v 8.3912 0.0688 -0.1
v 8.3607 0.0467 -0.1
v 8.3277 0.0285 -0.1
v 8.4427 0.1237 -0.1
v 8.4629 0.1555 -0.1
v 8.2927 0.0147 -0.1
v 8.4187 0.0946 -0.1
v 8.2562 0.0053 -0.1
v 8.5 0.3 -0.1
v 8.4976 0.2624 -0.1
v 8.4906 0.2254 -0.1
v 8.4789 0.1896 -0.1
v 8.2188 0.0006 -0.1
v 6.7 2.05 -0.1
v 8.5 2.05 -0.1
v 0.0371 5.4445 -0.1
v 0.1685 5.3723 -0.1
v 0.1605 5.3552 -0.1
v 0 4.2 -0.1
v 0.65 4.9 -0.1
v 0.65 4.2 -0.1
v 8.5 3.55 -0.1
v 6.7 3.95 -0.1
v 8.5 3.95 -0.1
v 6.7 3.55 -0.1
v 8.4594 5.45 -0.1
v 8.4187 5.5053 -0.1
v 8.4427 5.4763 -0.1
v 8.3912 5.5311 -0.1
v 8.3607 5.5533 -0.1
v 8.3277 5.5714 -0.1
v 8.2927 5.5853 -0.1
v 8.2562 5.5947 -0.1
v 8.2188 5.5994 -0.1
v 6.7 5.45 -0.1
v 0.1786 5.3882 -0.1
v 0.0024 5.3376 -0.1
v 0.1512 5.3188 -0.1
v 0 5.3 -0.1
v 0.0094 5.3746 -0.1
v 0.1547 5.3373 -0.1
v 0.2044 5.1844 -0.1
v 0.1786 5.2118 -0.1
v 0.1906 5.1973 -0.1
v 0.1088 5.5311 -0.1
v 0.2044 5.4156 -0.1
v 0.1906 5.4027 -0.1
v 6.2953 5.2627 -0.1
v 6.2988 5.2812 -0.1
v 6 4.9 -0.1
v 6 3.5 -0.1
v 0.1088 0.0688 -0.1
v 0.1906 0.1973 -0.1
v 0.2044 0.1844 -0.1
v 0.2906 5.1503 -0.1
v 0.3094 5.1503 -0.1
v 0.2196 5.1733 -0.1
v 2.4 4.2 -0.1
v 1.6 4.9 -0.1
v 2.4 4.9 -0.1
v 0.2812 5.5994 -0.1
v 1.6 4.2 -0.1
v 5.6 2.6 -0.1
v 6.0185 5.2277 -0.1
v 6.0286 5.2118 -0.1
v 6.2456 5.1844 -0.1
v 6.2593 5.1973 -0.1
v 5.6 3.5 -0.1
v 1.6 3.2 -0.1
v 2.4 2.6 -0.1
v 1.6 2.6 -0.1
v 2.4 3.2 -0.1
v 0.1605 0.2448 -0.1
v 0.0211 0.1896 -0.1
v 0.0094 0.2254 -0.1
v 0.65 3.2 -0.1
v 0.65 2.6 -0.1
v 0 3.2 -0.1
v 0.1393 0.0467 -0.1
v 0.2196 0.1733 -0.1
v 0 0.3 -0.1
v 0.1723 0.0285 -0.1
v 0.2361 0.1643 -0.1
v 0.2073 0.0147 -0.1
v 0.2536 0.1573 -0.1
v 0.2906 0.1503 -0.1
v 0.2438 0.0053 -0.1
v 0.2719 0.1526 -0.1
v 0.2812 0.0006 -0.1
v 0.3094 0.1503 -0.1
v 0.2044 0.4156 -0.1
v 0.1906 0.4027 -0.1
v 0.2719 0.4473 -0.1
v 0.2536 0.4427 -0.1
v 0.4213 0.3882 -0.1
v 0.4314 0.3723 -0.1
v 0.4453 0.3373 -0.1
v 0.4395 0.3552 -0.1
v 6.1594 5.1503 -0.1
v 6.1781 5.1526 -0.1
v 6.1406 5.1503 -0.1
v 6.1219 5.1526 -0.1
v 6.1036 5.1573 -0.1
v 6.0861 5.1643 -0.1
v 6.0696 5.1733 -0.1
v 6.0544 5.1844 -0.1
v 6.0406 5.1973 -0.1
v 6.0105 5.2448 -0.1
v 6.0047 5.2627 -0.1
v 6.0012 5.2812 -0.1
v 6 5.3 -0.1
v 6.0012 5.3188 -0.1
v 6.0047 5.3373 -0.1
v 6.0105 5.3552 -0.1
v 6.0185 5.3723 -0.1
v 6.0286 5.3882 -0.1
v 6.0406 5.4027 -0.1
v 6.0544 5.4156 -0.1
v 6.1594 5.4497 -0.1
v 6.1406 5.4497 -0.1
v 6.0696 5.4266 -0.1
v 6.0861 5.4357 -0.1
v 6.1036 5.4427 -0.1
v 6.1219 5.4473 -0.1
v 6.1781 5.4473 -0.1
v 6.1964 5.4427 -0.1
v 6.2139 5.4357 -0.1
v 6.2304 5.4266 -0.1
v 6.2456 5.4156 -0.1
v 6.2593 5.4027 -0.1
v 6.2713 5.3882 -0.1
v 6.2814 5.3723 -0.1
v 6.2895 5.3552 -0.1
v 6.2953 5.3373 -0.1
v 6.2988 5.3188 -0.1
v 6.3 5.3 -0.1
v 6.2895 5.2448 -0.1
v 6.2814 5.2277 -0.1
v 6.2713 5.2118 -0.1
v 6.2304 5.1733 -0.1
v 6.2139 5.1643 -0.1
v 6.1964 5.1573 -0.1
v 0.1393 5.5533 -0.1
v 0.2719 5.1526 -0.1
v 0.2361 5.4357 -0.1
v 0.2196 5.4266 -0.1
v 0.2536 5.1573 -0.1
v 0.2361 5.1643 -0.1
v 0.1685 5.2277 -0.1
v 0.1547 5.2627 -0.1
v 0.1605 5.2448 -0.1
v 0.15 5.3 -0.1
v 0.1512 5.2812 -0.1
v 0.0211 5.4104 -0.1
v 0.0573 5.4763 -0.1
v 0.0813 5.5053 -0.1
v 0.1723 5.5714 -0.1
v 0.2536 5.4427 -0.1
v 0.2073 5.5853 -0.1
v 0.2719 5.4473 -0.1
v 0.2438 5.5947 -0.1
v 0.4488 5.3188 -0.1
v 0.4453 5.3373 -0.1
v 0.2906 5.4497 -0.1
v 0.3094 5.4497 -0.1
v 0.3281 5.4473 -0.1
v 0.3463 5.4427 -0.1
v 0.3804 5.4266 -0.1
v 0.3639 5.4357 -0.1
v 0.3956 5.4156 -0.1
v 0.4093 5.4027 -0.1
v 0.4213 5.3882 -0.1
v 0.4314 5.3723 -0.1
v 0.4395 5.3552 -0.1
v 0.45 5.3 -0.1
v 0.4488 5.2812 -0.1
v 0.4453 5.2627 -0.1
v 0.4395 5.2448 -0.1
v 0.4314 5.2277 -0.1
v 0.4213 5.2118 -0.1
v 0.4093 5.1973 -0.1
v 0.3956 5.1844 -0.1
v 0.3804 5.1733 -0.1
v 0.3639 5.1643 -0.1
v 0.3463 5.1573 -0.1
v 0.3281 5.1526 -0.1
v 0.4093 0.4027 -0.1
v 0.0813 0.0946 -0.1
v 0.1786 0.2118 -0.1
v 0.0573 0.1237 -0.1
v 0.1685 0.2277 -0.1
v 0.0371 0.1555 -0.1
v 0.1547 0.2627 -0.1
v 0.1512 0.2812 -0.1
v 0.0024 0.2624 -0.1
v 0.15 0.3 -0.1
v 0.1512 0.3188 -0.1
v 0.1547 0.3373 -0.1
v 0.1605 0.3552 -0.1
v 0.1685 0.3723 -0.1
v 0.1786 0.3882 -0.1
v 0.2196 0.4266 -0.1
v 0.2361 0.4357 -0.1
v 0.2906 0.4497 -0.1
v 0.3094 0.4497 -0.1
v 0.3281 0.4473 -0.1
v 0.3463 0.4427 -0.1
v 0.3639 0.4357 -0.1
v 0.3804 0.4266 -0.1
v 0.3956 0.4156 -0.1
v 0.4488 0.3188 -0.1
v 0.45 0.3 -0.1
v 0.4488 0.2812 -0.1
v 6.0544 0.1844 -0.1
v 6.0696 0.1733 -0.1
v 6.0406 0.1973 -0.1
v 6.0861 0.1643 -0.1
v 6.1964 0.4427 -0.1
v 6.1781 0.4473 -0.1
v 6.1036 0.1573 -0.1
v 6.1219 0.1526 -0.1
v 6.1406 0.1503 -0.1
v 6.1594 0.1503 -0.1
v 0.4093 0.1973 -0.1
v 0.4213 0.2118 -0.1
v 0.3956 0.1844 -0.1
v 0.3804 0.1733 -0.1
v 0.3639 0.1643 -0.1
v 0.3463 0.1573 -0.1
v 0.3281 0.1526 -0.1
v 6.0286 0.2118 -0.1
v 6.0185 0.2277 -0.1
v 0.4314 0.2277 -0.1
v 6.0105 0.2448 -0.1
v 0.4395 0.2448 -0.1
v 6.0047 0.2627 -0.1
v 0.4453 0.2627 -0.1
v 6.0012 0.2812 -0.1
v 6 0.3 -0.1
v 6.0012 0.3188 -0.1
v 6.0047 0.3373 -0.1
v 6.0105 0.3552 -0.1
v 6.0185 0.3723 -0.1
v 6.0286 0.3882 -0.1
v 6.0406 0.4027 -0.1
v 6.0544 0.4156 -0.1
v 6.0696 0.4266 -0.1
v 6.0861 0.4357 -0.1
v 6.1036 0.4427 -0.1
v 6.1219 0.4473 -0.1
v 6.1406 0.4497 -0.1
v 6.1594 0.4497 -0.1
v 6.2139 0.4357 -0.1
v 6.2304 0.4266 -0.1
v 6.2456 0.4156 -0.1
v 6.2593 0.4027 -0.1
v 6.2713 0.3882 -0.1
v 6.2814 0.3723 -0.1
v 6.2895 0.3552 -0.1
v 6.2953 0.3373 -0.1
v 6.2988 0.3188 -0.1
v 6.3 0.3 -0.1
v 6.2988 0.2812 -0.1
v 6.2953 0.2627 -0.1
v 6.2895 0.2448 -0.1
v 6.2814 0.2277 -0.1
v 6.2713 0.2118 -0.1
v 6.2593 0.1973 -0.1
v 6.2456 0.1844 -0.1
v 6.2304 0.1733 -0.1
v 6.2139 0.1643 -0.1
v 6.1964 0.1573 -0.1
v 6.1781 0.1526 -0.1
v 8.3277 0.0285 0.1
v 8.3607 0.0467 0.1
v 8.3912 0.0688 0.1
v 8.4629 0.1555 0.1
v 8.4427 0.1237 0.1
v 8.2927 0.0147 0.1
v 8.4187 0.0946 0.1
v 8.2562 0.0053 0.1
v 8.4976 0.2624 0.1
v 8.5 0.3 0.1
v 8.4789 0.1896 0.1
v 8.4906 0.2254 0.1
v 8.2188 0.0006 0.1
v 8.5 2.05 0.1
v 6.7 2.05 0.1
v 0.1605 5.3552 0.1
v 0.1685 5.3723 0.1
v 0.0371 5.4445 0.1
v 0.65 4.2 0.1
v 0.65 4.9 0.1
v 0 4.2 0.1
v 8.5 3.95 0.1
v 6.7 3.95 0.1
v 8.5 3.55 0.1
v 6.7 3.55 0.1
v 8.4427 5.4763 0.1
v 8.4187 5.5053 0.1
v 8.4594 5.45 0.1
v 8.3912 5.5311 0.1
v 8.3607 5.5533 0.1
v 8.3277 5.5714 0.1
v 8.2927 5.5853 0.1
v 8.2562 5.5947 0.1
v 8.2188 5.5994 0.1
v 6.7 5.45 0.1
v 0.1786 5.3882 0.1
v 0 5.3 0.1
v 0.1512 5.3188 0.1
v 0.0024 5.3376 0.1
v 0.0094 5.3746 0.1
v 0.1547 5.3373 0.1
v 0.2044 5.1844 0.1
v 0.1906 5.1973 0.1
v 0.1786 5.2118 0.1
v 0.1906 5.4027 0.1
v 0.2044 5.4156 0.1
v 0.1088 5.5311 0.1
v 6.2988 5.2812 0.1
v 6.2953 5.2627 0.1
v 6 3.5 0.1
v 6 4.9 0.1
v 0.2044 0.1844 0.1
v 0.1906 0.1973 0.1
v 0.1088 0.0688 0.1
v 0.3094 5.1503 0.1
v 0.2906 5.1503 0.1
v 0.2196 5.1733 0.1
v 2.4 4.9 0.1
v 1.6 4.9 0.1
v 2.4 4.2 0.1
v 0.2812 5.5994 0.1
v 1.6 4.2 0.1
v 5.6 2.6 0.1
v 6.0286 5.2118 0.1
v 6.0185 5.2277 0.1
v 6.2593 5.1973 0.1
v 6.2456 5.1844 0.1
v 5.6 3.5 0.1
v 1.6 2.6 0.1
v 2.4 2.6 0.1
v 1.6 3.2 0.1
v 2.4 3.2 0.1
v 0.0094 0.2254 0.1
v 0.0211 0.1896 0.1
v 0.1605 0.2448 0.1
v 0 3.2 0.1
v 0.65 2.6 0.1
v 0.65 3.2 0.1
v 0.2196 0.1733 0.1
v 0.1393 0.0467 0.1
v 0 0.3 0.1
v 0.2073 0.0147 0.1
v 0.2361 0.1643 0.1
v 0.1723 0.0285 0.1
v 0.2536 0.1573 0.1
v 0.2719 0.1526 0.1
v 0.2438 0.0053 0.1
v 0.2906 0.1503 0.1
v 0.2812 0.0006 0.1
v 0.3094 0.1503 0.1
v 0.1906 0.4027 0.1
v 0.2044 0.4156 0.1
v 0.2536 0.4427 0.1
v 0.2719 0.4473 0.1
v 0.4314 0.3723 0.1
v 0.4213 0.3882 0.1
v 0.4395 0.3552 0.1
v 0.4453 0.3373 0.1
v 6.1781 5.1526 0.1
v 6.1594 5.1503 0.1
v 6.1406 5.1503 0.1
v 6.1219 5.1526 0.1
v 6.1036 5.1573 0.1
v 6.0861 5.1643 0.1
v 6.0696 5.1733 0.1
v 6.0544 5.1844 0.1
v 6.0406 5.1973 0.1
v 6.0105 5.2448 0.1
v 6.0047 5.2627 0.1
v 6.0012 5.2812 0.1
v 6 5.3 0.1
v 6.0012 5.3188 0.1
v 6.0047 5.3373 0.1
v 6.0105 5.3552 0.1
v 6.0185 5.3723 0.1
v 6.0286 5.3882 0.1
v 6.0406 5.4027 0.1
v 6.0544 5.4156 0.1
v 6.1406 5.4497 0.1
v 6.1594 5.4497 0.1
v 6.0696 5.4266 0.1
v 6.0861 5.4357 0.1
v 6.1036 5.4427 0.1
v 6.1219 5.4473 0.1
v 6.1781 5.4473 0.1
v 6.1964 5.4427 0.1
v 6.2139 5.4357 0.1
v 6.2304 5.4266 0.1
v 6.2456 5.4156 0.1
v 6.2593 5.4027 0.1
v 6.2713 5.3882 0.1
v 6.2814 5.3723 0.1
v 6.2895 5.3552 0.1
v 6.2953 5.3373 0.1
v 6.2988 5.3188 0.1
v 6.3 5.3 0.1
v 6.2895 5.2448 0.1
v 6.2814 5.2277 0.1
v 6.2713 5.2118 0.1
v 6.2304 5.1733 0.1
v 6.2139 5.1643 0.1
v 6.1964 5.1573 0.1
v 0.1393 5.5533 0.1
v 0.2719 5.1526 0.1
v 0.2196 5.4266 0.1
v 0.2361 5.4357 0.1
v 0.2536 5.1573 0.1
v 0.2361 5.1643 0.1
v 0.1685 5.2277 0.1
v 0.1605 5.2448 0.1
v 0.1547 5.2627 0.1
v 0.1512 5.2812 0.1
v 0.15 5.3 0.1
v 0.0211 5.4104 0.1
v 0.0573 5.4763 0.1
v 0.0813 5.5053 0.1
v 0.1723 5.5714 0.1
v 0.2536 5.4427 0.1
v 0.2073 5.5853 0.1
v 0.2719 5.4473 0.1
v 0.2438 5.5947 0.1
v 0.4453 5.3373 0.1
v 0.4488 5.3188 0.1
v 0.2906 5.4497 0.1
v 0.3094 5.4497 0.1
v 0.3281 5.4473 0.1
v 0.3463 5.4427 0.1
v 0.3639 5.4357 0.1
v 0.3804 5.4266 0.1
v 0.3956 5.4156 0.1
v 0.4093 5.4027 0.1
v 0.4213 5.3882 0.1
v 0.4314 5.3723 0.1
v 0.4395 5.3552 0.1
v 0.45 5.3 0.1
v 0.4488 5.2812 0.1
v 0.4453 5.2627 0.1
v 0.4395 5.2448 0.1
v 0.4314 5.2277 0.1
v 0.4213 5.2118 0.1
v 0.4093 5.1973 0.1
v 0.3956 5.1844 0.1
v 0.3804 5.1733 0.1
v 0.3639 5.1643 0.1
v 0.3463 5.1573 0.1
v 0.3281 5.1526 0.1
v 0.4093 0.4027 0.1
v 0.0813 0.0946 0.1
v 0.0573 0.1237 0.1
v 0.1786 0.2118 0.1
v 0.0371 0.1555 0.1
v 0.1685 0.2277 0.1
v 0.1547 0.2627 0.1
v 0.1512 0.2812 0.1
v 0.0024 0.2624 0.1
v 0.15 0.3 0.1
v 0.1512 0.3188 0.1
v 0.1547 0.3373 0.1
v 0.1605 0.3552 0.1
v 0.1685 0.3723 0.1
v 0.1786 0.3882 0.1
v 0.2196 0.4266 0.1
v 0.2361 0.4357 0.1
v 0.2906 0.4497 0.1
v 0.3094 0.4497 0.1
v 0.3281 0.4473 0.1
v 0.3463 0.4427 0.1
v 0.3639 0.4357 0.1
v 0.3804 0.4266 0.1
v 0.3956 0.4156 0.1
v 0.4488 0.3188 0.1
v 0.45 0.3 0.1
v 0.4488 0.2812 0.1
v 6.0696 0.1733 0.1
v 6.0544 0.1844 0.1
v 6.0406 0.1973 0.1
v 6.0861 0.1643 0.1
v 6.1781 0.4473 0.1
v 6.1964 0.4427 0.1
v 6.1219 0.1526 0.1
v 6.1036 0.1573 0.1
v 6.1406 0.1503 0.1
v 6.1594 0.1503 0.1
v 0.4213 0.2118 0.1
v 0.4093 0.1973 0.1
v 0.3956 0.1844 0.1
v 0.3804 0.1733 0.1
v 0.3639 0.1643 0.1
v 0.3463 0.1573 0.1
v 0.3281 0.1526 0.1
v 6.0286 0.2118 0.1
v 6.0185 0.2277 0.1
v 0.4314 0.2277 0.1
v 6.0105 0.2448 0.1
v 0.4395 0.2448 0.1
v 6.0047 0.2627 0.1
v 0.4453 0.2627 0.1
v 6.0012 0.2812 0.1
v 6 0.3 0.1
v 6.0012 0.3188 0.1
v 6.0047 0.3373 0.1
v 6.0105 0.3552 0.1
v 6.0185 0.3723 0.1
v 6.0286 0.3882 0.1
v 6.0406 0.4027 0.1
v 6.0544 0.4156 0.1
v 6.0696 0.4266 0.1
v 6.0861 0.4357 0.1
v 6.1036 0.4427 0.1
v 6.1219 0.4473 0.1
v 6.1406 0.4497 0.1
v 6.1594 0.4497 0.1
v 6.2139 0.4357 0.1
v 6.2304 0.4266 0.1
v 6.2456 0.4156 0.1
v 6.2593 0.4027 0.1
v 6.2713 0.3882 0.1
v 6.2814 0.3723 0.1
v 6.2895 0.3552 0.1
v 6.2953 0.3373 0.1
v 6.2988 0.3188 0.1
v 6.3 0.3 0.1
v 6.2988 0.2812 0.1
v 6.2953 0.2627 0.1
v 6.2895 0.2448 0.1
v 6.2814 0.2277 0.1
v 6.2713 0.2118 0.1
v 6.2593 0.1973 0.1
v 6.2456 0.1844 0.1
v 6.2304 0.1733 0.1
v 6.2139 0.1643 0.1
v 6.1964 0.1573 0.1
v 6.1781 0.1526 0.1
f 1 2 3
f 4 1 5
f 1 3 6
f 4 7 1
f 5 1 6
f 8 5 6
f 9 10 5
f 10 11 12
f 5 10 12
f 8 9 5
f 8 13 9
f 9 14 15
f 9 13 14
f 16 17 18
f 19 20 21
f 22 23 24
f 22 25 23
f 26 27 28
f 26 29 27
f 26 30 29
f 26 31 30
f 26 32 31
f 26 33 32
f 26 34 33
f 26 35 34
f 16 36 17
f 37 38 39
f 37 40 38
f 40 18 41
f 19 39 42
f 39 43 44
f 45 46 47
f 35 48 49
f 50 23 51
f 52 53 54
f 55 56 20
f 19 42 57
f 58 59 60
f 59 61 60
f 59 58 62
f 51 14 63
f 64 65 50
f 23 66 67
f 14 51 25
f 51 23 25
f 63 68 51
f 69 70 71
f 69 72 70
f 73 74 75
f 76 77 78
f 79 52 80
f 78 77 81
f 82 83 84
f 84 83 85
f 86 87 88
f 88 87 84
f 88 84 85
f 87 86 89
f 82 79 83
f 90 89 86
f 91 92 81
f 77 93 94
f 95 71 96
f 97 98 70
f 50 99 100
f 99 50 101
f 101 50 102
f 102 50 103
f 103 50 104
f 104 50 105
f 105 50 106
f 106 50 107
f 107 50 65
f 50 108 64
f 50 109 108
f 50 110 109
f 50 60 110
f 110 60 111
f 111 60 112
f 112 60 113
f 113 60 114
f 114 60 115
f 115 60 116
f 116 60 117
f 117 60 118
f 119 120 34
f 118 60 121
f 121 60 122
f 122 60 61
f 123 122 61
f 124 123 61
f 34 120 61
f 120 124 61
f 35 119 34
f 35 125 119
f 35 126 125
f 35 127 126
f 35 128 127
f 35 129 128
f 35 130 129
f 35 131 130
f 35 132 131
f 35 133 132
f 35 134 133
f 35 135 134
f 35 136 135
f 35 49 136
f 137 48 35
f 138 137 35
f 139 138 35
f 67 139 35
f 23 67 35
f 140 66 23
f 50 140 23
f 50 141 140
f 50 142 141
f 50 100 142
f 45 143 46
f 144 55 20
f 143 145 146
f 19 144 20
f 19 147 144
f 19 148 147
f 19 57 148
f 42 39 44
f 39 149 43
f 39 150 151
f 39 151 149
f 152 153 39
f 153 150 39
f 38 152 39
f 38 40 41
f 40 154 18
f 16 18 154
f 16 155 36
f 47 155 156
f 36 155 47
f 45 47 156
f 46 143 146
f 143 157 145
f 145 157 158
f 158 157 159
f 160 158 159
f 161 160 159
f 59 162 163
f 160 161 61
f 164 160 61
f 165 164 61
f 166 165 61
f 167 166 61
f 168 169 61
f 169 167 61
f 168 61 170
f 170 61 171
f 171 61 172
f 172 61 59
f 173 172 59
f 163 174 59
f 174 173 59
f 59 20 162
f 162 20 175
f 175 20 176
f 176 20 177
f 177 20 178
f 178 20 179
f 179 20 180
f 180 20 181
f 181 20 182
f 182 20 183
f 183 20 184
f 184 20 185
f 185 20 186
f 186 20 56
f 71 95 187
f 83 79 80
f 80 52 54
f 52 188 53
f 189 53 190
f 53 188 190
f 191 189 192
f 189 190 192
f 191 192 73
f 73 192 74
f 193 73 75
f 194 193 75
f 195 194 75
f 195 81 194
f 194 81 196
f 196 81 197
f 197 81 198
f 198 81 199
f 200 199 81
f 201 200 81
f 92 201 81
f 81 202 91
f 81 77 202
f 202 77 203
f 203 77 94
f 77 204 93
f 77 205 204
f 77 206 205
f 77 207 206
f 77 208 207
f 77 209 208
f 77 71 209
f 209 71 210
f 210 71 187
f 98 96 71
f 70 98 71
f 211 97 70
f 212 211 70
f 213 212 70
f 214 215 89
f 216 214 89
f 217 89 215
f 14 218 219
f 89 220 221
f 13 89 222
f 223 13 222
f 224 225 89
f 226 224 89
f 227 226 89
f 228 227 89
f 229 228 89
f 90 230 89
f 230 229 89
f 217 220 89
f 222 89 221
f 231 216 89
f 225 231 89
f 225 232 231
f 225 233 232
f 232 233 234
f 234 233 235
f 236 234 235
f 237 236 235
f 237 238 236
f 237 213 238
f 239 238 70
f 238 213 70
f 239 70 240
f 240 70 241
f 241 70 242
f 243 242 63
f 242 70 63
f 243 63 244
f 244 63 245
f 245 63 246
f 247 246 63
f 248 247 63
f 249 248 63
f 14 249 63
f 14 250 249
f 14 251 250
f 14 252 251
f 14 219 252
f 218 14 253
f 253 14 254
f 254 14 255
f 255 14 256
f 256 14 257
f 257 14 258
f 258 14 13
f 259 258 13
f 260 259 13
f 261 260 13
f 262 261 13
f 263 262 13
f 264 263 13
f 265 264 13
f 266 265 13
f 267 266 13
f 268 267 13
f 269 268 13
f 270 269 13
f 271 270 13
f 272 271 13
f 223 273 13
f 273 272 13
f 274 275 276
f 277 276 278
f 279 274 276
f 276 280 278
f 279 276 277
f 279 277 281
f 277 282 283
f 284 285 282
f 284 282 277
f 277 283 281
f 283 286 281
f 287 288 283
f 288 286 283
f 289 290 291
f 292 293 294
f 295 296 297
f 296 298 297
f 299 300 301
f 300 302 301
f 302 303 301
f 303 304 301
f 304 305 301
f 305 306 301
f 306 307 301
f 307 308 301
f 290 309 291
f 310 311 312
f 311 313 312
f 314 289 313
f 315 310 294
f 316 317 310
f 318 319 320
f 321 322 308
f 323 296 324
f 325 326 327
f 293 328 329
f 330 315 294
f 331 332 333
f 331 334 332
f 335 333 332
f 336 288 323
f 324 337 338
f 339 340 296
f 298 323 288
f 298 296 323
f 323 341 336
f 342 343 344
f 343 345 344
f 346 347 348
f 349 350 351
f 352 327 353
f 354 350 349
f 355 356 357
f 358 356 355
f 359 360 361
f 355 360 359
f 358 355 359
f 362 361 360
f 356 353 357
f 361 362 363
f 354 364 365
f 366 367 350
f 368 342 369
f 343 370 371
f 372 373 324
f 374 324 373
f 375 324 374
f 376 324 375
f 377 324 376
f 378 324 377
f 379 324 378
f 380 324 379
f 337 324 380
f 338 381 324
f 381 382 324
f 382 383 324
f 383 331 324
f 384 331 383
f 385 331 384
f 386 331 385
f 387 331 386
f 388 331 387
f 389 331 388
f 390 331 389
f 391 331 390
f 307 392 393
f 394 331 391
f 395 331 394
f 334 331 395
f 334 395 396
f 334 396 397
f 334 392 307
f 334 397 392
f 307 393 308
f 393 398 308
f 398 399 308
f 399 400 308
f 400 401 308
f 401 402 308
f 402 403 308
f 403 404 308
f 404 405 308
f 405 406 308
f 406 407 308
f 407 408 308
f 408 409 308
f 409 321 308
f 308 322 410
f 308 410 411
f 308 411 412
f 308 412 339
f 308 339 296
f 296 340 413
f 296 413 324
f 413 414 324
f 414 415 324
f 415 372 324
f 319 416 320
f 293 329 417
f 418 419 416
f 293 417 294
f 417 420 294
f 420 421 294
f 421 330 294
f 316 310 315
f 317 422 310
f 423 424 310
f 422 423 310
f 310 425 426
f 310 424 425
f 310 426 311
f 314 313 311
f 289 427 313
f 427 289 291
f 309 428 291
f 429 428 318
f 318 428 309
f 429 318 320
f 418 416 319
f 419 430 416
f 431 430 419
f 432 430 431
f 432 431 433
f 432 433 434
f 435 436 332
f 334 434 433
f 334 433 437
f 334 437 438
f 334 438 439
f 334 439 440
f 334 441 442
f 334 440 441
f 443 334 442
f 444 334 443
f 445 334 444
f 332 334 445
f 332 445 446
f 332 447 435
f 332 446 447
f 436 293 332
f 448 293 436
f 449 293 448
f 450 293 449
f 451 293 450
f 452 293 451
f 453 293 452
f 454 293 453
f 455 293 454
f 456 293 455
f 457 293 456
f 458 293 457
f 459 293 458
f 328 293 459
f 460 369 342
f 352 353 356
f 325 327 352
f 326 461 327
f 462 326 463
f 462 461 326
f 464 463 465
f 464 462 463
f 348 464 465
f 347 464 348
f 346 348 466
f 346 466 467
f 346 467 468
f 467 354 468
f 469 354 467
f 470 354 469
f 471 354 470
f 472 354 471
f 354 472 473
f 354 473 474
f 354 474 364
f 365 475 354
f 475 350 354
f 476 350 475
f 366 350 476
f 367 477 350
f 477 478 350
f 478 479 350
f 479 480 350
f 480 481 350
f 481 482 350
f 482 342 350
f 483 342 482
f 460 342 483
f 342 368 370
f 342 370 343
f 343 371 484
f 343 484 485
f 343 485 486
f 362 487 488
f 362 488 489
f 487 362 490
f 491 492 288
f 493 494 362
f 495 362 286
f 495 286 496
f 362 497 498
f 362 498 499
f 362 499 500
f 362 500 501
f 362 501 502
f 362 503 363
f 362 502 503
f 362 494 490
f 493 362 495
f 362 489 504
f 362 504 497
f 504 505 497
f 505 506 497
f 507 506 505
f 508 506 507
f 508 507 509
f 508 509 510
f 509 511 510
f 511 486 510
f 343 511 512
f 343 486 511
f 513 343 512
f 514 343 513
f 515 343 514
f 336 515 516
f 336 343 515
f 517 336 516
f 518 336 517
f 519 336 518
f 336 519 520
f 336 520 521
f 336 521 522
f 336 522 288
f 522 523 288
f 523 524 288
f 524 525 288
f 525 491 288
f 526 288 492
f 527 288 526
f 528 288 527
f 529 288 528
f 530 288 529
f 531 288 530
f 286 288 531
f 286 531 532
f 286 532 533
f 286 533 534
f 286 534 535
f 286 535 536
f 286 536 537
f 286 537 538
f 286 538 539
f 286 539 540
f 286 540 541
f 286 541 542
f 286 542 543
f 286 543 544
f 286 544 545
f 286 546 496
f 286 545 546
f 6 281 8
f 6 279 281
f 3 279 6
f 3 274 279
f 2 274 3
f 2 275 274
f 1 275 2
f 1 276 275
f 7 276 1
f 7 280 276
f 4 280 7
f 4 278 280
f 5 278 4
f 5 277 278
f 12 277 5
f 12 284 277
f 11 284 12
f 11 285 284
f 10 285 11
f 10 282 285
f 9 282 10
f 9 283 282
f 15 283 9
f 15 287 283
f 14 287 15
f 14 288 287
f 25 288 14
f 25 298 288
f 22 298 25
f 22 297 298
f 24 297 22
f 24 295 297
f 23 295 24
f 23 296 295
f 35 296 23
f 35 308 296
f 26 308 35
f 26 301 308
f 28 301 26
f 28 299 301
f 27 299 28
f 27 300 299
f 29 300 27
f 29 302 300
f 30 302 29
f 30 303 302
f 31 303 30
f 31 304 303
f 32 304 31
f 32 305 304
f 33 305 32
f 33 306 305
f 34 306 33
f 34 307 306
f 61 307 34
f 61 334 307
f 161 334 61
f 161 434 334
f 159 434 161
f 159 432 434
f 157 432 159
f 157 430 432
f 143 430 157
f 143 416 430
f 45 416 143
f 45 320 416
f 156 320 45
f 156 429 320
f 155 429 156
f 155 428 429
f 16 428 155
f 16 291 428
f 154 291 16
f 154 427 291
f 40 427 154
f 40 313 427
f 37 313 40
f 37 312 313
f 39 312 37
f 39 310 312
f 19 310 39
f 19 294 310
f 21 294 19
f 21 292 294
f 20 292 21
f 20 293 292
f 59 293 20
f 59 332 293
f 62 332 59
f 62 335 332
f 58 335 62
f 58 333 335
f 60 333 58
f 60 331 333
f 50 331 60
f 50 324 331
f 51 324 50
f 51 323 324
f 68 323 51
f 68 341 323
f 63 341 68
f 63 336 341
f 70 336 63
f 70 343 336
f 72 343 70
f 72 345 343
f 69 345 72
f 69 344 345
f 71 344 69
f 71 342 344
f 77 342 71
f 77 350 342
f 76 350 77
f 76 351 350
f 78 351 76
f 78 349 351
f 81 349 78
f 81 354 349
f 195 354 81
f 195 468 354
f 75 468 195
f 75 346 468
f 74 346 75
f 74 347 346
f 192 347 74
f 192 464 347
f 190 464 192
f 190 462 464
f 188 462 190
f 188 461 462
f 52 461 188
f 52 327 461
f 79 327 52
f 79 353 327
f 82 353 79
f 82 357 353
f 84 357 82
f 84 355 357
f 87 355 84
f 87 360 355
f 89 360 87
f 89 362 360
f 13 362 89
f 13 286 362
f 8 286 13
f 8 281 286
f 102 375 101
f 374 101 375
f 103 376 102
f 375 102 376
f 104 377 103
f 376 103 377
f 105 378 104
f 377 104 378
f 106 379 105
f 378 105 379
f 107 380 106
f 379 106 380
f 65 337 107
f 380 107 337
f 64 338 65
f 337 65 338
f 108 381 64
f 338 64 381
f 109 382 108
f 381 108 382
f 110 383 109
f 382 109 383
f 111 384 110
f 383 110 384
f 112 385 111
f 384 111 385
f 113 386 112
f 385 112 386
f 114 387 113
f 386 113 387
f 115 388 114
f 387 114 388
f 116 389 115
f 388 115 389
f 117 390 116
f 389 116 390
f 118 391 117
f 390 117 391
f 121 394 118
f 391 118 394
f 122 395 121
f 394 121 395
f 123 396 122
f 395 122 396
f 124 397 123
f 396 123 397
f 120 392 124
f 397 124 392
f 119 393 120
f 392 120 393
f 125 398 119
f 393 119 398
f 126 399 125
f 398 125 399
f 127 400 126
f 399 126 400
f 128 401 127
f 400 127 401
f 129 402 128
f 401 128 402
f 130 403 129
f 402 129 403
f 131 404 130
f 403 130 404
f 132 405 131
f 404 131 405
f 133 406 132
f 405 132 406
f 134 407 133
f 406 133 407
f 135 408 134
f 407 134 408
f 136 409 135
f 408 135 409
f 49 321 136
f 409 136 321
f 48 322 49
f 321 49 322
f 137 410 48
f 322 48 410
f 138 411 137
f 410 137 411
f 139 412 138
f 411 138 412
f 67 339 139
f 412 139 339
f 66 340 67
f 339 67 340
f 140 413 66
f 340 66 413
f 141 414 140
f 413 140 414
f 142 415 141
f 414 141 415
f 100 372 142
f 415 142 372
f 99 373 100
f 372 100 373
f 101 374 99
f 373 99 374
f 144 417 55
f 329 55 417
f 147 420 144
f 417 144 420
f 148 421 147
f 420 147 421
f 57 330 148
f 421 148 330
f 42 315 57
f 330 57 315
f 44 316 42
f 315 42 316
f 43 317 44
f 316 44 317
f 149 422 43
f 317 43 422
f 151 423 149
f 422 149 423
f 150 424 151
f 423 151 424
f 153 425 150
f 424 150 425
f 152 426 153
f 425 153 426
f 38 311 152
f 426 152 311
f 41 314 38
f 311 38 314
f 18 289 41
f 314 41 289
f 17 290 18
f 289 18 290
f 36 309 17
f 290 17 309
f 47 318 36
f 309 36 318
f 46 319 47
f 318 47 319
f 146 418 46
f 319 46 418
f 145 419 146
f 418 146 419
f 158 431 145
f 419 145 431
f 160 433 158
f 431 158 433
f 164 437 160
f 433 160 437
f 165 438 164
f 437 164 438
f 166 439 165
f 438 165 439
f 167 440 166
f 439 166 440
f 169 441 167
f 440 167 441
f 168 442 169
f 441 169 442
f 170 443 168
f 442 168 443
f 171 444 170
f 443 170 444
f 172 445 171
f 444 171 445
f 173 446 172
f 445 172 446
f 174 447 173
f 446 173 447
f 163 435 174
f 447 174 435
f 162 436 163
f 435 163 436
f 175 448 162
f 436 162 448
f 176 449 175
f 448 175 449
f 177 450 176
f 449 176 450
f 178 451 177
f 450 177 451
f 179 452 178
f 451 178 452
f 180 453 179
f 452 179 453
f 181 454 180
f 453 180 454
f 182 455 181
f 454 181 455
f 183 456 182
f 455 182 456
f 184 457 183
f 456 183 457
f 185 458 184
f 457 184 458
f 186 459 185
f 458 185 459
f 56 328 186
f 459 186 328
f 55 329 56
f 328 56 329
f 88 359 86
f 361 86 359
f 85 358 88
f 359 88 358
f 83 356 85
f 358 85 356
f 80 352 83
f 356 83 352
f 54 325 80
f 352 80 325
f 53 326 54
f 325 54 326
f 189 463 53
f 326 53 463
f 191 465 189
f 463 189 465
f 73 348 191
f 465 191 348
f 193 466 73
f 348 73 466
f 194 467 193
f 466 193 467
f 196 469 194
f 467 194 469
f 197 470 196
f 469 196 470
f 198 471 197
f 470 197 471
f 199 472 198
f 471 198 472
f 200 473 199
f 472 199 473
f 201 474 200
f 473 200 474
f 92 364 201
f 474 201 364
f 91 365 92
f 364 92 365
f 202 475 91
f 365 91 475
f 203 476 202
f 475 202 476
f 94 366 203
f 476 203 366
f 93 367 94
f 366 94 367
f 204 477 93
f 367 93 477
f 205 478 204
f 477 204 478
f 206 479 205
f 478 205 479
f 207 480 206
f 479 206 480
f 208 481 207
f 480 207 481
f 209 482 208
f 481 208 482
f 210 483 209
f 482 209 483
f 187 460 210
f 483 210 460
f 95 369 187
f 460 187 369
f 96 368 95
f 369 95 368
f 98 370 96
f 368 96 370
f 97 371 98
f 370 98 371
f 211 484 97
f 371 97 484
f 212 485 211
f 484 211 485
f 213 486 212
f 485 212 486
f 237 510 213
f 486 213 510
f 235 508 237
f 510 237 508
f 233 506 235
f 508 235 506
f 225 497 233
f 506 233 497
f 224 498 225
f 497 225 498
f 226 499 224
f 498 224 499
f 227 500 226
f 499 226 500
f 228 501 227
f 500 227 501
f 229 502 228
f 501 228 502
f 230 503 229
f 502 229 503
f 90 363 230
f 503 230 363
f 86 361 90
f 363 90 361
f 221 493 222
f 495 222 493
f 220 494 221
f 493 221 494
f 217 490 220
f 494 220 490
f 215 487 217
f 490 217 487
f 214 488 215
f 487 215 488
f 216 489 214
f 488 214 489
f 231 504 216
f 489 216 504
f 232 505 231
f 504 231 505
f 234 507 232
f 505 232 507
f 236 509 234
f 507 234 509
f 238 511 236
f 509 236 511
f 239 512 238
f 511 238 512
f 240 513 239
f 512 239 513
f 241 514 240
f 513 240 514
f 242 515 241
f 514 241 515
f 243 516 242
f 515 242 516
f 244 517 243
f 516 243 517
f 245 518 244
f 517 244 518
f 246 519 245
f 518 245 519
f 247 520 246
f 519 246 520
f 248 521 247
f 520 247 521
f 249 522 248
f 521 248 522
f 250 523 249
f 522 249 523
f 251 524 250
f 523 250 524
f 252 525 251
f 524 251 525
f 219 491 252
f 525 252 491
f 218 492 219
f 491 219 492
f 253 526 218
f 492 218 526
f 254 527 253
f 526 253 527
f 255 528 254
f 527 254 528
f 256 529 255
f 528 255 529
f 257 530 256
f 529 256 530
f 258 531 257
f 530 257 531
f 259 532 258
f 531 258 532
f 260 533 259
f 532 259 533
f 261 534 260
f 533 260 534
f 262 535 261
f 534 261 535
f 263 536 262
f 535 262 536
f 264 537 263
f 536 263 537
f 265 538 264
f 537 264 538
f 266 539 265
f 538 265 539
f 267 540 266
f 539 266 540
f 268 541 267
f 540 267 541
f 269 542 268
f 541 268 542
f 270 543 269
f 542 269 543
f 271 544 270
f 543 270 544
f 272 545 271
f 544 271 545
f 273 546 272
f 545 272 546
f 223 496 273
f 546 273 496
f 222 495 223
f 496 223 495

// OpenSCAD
module roundedSquare( width, length, radiusCorner ) {
	translate( [ radiusCorner, radiusCorner, 0 ] )
		minkowski() {
			square( [width - 2 * radiusCorner, length - 2 * radiusCorner], false);
			circle(radiusCorner, $fn=50);
		}
}

//Make it 3D
linear_extrude(height = 0.2, center = true, convexity = 10, twist = 0)
difference()
{
    roundedSquare(8.5, 5.6, 0.3);
    
    // Mounting holes
    translate([0.3,0.3])
        circle(0.15, true, $fn=50);
    translate([6.15,0.3])
        circle(0.15, true, $fn=50);
    translate([6.15,5.3])
        circle(0.15, true, $fn=50);
    translate([0.3,5.3])
        circle(0.15, true, $fn=50);
    
    //USB 1
    translate([7.6,4.7])
        square([1.8, 1.5], true);
    
    //USB 2
    translate([7.6,2.8])
        square([1.8, 1.5], true);
    
    // Huge hole
    difference()
    {
        translate([3,3.75])
            square([6, 2.3], true);
        
        translate([0.3,4.6])
            square([0.7, 0.8], true);
        
        // left down
        translate([0.3,2.8])
            square([0.7, 0.8], true);
        
        // middle up
        translate([2,2.8])
            square([0.8, 0.8], true);
        
        // middle down
        translate([2,4.6])
            square([0.8, 0.8], true);
        
        // far right down
        translate([5.8,2.9])
            square([0.4, 1.2], true);
    }
}
